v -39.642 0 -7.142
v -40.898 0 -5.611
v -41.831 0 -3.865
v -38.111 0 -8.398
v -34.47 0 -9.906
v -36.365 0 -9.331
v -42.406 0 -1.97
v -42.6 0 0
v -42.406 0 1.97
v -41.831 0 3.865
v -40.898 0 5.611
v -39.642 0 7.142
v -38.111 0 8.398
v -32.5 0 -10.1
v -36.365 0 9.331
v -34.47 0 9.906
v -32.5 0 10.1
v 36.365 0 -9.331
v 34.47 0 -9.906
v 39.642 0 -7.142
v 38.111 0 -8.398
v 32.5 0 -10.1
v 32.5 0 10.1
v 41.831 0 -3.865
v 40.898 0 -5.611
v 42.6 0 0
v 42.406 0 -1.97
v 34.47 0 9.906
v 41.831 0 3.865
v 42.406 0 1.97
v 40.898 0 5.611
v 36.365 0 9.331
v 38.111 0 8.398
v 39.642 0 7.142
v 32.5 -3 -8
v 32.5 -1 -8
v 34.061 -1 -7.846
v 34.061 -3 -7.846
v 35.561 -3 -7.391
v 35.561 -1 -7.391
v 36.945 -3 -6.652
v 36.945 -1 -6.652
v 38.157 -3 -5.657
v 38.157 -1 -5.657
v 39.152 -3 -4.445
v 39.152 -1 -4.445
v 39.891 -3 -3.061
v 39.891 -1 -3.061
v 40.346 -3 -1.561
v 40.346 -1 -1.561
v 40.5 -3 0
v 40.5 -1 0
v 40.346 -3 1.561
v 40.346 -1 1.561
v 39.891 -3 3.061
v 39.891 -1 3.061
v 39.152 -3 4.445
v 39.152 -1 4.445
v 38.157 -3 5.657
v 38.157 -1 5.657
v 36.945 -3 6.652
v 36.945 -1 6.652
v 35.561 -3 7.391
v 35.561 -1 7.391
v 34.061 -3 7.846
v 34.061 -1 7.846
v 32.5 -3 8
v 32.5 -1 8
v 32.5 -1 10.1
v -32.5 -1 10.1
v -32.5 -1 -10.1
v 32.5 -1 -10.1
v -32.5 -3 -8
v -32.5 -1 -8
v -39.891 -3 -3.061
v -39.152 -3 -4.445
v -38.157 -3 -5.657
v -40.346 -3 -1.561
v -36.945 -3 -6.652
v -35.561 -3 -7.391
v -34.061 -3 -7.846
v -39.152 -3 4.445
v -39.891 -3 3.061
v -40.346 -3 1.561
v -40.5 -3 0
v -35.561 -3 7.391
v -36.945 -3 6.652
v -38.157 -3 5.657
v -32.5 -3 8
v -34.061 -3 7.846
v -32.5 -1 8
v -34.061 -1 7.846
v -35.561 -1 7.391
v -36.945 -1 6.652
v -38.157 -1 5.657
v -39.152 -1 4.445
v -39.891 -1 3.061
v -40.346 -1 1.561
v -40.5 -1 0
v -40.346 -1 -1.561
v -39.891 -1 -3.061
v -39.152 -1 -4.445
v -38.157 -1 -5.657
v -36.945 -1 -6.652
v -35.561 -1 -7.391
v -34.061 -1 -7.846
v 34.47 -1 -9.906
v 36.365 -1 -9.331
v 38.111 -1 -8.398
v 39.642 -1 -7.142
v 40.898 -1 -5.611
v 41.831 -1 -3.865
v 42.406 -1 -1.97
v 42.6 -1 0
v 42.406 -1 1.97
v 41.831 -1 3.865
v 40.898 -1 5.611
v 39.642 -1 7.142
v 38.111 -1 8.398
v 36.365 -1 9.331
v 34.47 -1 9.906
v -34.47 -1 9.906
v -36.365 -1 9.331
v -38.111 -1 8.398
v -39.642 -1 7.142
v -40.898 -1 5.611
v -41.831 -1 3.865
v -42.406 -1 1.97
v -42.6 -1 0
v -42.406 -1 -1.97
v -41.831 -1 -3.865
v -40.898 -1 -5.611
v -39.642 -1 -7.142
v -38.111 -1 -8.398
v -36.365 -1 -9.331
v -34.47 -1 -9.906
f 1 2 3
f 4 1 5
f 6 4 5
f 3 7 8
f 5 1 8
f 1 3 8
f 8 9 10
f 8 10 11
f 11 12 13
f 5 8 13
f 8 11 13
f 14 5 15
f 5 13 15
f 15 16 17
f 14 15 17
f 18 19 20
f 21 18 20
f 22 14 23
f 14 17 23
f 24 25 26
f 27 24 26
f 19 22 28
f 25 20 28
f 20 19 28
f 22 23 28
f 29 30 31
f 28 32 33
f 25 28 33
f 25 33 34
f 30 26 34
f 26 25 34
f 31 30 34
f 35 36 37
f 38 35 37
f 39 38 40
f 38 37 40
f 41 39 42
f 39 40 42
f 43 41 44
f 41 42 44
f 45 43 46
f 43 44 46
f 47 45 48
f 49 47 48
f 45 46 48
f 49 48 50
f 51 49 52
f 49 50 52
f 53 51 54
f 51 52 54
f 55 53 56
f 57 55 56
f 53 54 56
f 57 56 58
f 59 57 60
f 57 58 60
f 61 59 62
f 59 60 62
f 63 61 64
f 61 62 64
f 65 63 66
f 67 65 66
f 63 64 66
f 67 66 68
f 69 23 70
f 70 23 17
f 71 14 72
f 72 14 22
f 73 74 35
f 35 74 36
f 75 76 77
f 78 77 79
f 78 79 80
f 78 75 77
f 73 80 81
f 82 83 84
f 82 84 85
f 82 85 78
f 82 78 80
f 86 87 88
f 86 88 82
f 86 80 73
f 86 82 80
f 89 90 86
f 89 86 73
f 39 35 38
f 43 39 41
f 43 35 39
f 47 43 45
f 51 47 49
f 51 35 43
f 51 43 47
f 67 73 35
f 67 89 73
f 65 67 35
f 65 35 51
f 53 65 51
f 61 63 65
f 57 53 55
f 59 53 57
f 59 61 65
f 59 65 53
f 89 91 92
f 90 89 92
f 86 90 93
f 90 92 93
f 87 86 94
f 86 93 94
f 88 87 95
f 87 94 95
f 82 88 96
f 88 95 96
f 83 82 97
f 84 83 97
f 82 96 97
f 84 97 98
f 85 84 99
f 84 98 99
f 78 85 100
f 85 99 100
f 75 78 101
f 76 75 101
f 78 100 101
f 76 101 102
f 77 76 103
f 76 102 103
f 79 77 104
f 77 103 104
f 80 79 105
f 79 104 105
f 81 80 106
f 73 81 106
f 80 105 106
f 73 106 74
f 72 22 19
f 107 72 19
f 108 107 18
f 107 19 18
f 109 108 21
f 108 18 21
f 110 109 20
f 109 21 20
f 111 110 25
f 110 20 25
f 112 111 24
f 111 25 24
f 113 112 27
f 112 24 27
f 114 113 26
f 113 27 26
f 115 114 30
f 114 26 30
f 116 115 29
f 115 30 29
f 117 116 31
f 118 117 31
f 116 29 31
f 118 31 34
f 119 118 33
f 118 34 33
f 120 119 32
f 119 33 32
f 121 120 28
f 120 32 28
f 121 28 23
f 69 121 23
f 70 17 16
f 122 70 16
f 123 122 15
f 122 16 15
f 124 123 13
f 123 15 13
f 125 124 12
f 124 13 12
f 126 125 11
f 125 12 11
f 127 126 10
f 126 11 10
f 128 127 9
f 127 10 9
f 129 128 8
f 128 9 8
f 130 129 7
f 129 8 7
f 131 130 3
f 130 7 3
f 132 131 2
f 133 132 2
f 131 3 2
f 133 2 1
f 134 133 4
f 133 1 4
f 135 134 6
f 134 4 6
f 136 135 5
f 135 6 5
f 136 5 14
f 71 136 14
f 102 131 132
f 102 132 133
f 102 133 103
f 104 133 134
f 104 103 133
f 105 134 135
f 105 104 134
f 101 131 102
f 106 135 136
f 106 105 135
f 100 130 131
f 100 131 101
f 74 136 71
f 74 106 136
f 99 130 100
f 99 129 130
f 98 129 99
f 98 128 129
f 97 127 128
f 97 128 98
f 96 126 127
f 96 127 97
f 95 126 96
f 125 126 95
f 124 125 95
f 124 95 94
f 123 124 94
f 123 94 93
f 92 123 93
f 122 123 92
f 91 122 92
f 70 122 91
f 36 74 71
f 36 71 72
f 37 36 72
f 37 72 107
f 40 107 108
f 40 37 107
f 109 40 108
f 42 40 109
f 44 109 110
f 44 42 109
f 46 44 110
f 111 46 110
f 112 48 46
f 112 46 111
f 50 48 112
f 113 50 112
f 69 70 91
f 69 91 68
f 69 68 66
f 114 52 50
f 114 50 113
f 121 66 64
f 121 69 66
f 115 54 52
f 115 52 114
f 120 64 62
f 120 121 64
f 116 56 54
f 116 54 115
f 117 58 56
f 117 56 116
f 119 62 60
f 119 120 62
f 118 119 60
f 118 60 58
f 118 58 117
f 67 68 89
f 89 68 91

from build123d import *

# Parameters (mm, degrees)
F1_DEPTH = 1
F2_DEPTH = 3


with BuildPart() as f1:
    # F0 (on Front) → F1 (new body)
    with BuildSketch(Plane.XZ):
        with BuildLine():
            Line((-32.5, 8.5), (-32.5, 10.1))
            ThreePointArc((-32.5, 10.1), (-42.6, 0), (-32.5, -10.1))
            Line((-32.5, -10.1), (32.5, -10.1))
            Line((32.5, -10.1), (32.5, -8.5))
            Line((32.5, -8.5), (-32.5, -8.5))
            ThreePointArc((-32.5, -8.5), (-41, 0), (-32.5, 8.5))
        make_face()
        with BuildLine():
            Line((32.5, 10.1), (-32.5, 10.1))
            Line((-32.5, 10.1), (-32.5, 8.5))
            Line((-32.5, 8.5), (32.5, 8.5))
            ThreePointArc((32.5, 8.5), (41, 0), (32.5, -8.5))
            Line((32.5, -8.5), (32.5, -10.1))
            ThreePointArc((32.5, -10.1), (42.6, 0), (32.5, 10.1))
        make_face()
        with BuildLine():
            Line((32.5, 8.5), (-32.5, 8.5))
            Line((-32.5, 8.5), (-32.5, 8))
            Line((-32.5, 8), (32.5, 8))
            ThreePointArc((32.5, 8), (40.5, 0), (32.5, -8))
            Line((32.5, -8), (32.5, -8.5))
            ThreePointArc((32.5, -8.5), (41, 0), (32.5, 8.5))
        make_face()
        with BuildLine():
            Line((-32.5, 8), (-32.5, 8.5))
            ThreePointArc((-32.5, 8.5), (-41, 0), (-32.5, -8.5))
            Line((-32.5, -8.5), (32.5, -8.5))
            Line((32.5, -8.5), (32.5, -8))
            Line((32.5, -8), (-32.5, -8))
            ThreePointArc((-32.5, -8), (-40.5, 0), (-32.5, 8))
        make_face()
    extrude(amount=F1_DEPTH)

    # F0 (on Front) → F2 (join)
    with BuildSketch(Plane.XZ):
        with BuildLine():
            Line((32.5, 8), (-32.5, 8))
            ThreePointArc((-32.5, 8), (-40.5, 0), (-32.5, -8))
            Line((-32.5, -8), (32.5, -8))
            ThreePointArc((32.5, -8), (40.5, 0), (32.5, 8))
        make_face()
    extrude(amount=F2_DEPTH)


solid = f1.part
